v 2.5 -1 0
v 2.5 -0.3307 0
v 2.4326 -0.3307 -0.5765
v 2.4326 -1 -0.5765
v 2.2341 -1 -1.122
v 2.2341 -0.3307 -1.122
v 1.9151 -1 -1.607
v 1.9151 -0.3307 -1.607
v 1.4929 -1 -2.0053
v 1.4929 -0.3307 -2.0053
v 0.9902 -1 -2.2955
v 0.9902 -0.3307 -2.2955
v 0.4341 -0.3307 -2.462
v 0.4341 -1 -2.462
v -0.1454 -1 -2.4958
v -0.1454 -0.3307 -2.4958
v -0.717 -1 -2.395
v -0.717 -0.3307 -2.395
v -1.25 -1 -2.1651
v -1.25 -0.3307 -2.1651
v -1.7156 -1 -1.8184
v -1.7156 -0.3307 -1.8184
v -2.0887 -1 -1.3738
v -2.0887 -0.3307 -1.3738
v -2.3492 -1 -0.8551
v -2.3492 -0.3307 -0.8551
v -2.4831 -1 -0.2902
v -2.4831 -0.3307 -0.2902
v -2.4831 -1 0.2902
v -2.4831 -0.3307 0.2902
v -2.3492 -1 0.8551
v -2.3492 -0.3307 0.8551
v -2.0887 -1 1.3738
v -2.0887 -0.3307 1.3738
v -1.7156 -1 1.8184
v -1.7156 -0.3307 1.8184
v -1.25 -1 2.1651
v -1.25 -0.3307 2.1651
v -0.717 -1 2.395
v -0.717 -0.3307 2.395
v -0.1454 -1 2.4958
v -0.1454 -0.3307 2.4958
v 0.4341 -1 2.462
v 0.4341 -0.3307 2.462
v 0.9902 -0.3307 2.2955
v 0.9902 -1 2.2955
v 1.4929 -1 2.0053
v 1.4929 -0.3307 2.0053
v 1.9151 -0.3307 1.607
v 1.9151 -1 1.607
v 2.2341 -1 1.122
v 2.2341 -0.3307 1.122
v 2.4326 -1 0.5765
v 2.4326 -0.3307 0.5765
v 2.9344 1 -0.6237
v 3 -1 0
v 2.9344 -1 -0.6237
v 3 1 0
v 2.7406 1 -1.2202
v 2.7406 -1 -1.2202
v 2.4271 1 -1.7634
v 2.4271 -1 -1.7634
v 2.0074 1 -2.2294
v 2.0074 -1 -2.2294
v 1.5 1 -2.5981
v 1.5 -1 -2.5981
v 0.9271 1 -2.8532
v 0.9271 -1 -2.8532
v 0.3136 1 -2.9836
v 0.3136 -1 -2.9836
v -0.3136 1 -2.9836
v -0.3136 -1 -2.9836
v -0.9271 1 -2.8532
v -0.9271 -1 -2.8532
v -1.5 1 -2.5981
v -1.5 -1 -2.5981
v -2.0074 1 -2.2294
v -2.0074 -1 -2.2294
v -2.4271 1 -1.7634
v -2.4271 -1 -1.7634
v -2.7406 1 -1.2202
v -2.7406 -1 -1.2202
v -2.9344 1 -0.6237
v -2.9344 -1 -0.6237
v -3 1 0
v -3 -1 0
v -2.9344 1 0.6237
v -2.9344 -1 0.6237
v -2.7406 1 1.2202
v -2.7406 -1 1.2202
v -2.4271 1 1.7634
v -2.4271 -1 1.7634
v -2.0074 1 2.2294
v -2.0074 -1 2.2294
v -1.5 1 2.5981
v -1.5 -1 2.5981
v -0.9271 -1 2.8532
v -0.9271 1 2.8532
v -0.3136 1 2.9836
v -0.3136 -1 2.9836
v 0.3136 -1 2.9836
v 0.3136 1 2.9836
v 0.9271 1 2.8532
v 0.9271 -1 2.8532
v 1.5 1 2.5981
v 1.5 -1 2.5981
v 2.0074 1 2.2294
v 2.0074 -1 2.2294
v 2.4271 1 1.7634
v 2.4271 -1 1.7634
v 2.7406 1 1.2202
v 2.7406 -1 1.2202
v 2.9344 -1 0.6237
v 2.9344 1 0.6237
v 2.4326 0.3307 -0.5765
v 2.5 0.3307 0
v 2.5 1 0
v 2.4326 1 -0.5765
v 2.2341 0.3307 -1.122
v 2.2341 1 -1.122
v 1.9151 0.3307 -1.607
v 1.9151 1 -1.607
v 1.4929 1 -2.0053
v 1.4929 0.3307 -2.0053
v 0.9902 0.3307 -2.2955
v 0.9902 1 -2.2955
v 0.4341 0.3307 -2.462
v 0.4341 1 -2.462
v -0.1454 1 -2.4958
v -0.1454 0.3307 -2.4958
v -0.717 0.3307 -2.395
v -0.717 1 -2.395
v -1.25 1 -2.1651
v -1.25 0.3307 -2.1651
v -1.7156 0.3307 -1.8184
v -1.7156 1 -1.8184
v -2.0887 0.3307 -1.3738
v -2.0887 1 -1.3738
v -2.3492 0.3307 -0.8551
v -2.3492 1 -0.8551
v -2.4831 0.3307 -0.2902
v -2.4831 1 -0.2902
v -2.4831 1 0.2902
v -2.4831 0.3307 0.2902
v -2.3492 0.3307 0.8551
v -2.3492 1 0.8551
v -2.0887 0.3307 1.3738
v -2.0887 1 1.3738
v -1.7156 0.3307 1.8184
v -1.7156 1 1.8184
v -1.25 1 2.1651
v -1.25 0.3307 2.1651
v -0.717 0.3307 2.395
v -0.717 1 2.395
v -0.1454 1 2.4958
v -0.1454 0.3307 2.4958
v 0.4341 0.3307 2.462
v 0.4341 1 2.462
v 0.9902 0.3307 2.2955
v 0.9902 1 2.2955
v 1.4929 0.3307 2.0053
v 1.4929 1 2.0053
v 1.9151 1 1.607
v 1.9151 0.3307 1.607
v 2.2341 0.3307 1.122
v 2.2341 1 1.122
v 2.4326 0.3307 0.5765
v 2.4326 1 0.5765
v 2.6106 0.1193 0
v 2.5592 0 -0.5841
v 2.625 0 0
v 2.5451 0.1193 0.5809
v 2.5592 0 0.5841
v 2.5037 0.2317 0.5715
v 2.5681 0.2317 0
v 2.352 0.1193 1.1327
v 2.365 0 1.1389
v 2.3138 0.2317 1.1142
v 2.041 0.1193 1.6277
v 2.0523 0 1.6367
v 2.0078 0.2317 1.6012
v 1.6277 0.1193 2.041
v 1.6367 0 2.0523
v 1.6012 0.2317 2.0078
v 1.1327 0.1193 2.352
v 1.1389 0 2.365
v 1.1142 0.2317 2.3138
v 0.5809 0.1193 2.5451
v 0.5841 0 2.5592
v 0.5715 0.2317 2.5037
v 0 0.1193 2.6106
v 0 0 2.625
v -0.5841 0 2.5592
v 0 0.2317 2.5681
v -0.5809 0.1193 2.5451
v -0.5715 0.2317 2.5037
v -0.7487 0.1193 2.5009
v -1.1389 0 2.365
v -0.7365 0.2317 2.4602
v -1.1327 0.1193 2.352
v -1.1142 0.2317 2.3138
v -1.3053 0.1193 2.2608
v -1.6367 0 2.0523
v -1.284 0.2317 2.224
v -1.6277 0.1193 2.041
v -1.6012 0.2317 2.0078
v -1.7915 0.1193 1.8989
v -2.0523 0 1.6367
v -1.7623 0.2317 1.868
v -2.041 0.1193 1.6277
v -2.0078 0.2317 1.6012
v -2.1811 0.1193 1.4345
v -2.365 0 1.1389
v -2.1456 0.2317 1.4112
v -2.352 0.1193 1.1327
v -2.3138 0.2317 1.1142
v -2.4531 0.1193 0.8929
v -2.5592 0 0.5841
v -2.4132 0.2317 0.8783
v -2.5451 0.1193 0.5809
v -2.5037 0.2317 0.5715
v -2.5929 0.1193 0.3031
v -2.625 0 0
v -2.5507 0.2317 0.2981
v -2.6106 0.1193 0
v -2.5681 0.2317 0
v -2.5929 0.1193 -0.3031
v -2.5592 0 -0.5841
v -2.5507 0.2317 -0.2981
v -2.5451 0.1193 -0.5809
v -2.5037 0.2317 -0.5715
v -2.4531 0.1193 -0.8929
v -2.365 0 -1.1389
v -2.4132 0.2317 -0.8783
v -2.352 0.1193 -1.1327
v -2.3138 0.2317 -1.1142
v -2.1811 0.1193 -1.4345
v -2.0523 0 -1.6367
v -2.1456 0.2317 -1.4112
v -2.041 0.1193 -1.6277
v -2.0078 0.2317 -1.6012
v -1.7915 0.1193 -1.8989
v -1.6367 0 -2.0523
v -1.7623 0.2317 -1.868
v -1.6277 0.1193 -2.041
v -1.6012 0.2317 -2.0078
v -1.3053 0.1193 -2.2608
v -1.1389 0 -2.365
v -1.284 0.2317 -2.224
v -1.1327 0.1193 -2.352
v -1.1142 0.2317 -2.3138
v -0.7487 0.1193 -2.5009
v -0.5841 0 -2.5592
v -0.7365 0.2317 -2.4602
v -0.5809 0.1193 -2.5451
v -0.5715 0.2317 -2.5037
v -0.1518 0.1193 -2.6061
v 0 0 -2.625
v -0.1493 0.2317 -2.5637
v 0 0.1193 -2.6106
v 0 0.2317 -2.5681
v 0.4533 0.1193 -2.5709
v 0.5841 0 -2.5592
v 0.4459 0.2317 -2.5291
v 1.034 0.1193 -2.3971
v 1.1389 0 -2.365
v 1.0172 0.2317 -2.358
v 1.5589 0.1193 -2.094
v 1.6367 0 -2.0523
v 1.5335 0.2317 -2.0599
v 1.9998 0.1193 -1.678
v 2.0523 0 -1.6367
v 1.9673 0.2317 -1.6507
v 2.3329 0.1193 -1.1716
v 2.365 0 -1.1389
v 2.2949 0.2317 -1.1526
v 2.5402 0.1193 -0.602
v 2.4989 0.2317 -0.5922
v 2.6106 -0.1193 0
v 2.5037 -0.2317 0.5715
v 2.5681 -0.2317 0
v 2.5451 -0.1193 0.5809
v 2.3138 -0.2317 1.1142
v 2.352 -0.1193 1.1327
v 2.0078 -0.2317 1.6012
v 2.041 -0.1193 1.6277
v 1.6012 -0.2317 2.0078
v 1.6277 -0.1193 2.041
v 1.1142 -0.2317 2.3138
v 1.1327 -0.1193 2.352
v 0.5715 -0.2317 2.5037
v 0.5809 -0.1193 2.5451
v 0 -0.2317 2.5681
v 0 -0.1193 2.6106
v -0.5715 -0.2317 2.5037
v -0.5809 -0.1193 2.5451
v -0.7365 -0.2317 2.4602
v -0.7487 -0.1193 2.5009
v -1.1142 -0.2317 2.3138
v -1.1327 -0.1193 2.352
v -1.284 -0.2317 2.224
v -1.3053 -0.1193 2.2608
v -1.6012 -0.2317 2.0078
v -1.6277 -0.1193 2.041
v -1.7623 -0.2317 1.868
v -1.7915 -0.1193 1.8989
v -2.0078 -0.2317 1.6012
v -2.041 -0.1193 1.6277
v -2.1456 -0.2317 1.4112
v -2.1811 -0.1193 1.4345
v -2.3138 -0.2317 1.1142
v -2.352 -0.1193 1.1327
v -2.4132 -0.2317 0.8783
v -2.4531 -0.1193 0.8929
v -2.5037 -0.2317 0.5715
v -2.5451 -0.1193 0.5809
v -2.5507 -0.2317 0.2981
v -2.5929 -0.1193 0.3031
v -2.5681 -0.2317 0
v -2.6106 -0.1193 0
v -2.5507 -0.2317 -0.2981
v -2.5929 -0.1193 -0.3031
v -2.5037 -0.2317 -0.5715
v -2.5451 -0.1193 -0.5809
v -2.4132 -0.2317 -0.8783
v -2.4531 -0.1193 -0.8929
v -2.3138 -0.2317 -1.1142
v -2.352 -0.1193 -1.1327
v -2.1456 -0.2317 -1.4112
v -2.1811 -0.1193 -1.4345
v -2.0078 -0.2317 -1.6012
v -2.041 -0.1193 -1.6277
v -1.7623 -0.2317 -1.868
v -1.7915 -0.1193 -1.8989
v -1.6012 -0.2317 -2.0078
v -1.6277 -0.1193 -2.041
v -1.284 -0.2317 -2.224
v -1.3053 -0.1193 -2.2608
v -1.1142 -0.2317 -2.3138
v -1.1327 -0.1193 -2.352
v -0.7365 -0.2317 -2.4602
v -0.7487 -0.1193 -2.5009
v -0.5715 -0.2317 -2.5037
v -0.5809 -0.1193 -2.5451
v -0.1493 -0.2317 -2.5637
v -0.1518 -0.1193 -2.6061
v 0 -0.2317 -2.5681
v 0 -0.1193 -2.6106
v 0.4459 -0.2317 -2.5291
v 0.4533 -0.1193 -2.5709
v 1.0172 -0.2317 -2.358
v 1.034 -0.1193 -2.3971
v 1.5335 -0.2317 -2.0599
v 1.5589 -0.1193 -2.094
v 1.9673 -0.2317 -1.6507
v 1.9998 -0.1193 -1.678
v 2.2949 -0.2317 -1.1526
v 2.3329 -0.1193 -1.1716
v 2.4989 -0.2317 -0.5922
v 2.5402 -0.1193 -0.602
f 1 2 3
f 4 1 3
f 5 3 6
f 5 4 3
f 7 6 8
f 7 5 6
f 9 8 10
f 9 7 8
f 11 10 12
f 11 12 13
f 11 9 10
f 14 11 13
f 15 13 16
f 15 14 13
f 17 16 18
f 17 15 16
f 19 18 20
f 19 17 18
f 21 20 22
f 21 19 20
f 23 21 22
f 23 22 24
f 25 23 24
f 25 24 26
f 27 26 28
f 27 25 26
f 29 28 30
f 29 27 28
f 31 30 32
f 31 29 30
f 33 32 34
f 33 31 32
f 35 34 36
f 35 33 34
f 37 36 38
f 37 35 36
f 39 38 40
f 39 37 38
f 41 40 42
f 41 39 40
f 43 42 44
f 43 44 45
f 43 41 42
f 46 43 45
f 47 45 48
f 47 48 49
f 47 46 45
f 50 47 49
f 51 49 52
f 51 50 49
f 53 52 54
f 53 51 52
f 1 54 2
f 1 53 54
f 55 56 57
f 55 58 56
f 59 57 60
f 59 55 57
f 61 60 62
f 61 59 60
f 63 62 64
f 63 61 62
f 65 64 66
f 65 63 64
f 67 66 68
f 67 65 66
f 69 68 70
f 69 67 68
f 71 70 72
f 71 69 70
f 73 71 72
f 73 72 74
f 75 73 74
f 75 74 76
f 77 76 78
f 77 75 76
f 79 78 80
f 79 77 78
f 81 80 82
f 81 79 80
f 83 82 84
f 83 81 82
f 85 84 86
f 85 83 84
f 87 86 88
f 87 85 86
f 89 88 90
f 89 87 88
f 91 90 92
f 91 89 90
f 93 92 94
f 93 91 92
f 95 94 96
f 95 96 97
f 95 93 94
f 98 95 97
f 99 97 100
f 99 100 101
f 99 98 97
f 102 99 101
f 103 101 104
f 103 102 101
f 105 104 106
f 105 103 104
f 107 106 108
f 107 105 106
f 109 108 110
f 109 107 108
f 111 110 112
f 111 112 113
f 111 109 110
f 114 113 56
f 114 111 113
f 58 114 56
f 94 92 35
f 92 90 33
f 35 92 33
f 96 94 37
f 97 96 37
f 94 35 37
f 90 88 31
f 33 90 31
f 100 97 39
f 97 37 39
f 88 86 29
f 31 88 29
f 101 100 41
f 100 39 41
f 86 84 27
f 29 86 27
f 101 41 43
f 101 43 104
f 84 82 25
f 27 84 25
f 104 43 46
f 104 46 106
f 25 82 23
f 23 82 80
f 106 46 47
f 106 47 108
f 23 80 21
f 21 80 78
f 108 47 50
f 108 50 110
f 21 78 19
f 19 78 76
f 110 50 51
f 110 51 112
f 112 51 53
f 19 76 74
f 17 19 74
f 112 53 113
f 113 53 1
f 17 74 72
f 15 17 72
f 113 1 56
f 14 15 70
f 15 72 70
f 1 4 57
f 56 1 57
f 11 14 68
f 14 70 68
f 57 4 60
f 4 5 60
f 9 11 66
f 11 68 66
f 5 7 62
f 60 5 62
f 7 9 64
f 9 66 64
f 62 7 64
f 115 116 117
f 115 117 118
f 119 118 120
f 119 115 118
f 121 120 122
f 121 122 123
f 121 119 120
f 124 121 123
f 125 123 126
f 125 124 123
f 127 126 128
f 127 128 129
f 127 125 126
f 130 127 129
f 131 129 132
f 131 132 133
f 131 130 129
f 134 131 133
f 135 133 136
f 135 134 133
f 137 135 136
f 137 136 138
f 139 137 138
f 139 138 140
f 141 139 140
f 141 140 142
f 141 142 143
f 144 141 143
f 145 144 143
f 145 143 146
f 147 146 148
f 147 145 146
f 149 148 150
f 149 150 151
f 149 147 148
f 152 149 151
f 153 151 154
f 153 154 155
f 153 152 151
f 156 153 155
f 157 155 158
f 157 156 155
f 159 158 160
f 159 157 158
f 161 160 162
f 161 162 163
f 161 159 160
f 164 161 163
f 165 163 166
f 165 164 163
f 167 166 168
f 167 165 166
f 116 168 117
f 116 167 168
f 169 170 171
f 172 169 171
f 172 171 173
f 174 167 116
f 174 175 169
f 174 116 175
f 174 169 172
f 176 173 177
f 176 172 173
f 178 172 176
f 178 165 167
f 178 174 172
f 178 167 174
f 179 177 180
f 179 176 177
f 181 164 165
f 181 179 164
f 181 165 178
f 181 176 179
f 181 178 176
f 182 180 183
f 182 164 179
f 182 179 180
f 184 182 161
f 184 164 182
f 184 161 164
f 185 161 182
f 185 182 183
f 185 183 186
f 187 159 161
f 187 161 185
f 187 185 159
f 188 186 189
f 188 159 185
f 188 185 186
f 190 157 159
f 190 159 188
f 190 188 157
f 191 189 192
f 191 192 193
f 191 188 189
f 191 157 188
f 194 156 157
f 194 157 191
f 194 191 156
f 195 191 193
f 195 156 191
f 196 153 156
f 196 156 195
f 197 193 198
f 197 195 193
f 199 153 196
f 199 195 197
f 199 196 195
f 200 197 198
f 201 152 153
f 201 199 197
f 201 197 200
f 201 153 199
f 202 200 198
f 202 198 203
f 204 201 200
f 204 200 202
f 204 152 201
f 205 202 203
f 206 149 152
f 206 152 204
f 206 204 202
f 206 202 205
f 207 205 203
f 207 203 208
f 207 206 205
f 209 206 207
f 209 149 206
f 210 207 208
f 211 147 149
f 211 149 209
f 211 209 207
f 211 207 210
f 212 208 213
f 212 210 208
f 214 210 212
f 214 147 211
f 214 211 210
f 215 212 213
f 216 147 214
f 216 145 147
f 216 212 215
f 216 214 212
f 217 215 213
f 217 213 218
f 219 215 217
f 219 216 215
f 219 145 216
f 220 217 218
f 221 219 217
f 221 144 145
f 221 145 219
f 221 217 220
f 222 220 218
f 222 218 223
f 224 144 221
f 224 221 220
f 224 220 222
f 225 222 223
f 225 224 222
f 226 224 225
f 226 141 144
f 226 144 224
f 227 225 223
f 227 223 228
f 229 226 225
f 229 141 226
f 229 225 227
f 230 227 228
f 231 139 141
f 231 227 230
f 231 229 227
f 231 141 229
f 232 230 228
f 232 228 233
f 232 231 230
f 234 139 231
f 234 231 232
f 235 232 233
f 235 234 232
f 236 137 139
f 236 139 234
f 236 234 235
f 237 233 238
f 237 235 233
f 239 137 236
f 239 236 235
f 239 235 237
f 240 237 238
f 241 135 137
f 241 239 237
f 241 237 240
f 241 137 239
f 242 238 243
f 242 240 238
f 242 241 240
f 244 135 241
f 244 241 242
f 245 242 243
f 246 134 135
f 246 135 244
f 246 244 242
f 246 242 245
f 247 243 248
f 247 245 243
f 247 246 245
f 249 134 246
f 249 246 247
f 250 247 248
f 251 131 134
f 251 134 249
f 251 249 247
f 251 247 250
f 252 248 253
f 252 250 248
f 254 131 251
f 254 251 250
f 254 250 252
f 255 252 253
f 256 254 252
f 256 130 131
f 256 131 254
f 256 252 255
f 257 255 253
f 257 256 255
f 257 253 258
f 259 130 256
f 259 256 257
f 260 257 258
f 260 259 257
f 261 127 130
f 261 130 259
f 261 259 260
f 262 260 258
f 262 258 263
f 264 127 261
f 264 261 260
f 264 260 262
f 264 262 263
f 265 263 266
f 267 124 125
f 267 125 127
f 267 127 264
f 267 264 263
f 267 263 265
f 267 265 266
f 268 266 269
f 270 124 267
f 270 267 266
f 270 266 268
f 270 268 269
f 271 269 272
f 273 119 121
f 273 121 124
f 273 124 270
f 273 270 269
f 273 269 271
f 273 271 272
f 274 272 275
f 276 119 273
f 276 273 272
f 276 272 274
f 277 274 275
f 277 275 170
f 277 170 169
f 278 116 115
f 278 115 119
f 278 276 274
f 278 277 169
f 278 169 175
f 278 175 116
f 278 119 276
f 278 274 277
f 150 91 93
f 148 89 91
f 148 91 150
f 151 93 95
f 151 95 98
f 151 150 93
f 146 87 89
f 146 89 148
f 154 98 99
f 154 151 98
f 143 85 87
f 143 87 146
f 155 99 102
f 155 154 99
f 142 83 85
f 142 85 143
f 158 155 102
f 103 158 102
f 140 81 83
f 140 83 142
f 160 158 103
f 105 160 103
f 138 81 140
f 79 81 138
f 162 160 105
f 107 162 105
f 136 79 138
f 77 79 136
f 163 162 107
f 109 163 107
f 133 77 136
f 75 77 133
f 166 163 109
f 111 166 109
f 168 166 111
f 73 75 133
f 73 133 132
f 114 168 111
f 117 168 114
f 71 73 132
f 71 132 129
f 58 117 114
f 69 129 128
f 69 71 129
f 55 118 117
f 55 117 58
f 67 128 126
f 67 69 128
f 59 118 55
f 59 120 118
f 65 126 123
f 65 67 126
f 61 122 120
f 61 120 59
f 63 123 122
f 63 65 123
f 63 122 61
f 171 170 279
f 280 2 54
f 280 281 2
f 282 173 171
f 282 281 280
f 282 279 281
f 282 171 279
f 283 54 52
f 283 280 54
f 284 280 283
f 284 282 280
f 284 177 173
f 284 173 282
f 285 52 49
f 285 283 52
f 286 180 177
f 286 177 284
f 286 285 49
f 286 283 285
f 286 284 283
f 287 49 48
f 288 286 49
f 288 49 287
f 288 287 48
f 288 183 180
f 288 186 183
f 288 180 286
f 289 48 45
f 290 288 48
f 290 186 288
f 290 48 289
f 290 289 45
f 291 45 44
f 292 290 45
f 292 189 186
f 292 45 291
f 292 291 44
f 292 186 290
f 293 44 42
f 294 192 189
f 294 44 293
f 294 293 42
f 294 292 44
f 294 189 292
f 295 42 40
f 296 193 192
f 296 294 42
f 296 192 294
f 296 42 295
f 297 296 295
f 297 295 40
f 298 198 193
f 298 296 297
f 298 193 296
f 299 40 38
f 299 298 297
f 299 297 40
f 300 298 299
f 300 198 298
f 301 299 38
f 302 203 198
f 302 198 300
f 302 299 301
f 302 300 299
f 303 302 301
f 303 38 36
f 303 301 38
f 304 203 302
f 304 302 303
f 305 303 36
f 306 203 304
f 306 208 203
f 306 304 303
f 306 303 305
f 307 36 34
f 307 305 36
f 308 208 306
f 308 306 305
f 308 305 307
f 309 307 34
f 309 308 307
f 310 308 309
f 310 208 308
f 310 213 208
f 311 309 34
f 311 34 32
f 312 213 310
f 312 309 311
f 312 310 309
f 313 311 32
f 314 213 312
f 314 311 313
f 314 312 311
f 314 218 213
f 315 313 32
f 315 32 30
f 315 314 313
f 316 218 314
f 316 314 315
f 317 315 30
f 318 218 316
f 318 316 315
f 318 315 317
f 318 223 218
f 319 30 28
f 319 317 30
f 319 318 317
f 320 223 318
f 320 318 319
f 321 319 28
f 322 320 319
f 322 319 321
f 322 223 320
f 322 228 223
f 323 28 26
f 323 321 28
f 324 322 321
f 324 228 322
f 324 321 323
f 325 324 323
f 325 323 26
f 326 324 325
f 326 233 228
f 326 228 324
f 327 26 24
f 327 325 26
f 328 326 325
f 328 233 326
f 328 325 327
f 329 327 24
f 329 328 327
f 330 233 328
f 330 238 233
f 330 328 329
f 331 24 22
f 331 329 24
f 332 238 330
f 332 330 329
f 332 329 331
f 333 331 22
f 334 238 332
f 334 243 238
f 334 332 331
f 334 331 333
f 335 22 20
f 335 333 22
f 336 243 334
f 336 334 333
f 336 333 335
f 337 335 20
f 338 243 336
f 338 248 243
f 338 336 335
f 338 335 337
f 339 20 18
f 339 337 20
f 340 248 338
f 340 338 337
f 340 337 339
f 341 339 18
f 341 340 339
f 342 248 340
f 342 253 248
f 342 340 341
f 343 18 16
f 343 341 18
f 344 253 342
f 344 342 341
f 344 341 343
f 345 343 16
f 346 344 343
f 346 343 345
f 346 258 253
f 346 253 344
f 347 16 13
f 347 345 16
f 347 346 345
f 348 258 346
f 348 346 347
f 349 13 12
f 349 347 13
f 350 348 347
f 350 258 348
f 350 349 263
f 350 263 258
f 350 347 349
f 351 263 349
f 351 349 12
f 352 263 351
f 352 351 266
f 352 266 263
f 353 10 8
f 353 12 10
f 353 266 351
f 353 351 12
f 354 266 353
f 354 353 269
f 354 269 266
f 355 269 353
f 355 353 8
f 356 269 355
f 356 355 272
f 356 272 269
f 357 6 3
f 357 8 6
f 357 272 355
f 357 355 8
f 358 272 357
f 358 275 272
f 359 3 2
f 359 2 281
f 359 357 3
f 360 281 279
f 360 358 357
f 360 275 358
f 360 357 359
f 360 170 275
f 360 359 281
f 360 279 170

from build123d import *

# Parameters (mm, degrees)
DIAPROFILES_R         = 3
DIAPROFILES_R_2       = 2.5
DIAPROFILE_DEPTH      = 1
BEARINGPATHPROFILES_R = 0.5


with BuildPart() as part:
    # DiaProfileS → DiaProfile (new body, symmetric)
    with BuildSketch(Plane(origin=(0, 0, 0), x_dir=(1, 0, 0), z_dir=(0, 1, 0))):
        Circle(DIAPROFILES_R)
        Circle(DIAPROFILES_R_2, mode=Mode.SUBTRACT)
    extrude(amount=DIAPROFILE_DEPTH, both=True)

    # BearingPathProfileS → BearingPathProfile (revolve, cut)
    with BuildSketch(Plane.XY):
        with Locations((2.125, 0)):
            Circle(BEARINGPATHPROFILES_R)
    revolve(axis=Axis((0, 1, 0), (0, -1, 0)), mode=Mode.SUBTRACT)


solid = part.part
